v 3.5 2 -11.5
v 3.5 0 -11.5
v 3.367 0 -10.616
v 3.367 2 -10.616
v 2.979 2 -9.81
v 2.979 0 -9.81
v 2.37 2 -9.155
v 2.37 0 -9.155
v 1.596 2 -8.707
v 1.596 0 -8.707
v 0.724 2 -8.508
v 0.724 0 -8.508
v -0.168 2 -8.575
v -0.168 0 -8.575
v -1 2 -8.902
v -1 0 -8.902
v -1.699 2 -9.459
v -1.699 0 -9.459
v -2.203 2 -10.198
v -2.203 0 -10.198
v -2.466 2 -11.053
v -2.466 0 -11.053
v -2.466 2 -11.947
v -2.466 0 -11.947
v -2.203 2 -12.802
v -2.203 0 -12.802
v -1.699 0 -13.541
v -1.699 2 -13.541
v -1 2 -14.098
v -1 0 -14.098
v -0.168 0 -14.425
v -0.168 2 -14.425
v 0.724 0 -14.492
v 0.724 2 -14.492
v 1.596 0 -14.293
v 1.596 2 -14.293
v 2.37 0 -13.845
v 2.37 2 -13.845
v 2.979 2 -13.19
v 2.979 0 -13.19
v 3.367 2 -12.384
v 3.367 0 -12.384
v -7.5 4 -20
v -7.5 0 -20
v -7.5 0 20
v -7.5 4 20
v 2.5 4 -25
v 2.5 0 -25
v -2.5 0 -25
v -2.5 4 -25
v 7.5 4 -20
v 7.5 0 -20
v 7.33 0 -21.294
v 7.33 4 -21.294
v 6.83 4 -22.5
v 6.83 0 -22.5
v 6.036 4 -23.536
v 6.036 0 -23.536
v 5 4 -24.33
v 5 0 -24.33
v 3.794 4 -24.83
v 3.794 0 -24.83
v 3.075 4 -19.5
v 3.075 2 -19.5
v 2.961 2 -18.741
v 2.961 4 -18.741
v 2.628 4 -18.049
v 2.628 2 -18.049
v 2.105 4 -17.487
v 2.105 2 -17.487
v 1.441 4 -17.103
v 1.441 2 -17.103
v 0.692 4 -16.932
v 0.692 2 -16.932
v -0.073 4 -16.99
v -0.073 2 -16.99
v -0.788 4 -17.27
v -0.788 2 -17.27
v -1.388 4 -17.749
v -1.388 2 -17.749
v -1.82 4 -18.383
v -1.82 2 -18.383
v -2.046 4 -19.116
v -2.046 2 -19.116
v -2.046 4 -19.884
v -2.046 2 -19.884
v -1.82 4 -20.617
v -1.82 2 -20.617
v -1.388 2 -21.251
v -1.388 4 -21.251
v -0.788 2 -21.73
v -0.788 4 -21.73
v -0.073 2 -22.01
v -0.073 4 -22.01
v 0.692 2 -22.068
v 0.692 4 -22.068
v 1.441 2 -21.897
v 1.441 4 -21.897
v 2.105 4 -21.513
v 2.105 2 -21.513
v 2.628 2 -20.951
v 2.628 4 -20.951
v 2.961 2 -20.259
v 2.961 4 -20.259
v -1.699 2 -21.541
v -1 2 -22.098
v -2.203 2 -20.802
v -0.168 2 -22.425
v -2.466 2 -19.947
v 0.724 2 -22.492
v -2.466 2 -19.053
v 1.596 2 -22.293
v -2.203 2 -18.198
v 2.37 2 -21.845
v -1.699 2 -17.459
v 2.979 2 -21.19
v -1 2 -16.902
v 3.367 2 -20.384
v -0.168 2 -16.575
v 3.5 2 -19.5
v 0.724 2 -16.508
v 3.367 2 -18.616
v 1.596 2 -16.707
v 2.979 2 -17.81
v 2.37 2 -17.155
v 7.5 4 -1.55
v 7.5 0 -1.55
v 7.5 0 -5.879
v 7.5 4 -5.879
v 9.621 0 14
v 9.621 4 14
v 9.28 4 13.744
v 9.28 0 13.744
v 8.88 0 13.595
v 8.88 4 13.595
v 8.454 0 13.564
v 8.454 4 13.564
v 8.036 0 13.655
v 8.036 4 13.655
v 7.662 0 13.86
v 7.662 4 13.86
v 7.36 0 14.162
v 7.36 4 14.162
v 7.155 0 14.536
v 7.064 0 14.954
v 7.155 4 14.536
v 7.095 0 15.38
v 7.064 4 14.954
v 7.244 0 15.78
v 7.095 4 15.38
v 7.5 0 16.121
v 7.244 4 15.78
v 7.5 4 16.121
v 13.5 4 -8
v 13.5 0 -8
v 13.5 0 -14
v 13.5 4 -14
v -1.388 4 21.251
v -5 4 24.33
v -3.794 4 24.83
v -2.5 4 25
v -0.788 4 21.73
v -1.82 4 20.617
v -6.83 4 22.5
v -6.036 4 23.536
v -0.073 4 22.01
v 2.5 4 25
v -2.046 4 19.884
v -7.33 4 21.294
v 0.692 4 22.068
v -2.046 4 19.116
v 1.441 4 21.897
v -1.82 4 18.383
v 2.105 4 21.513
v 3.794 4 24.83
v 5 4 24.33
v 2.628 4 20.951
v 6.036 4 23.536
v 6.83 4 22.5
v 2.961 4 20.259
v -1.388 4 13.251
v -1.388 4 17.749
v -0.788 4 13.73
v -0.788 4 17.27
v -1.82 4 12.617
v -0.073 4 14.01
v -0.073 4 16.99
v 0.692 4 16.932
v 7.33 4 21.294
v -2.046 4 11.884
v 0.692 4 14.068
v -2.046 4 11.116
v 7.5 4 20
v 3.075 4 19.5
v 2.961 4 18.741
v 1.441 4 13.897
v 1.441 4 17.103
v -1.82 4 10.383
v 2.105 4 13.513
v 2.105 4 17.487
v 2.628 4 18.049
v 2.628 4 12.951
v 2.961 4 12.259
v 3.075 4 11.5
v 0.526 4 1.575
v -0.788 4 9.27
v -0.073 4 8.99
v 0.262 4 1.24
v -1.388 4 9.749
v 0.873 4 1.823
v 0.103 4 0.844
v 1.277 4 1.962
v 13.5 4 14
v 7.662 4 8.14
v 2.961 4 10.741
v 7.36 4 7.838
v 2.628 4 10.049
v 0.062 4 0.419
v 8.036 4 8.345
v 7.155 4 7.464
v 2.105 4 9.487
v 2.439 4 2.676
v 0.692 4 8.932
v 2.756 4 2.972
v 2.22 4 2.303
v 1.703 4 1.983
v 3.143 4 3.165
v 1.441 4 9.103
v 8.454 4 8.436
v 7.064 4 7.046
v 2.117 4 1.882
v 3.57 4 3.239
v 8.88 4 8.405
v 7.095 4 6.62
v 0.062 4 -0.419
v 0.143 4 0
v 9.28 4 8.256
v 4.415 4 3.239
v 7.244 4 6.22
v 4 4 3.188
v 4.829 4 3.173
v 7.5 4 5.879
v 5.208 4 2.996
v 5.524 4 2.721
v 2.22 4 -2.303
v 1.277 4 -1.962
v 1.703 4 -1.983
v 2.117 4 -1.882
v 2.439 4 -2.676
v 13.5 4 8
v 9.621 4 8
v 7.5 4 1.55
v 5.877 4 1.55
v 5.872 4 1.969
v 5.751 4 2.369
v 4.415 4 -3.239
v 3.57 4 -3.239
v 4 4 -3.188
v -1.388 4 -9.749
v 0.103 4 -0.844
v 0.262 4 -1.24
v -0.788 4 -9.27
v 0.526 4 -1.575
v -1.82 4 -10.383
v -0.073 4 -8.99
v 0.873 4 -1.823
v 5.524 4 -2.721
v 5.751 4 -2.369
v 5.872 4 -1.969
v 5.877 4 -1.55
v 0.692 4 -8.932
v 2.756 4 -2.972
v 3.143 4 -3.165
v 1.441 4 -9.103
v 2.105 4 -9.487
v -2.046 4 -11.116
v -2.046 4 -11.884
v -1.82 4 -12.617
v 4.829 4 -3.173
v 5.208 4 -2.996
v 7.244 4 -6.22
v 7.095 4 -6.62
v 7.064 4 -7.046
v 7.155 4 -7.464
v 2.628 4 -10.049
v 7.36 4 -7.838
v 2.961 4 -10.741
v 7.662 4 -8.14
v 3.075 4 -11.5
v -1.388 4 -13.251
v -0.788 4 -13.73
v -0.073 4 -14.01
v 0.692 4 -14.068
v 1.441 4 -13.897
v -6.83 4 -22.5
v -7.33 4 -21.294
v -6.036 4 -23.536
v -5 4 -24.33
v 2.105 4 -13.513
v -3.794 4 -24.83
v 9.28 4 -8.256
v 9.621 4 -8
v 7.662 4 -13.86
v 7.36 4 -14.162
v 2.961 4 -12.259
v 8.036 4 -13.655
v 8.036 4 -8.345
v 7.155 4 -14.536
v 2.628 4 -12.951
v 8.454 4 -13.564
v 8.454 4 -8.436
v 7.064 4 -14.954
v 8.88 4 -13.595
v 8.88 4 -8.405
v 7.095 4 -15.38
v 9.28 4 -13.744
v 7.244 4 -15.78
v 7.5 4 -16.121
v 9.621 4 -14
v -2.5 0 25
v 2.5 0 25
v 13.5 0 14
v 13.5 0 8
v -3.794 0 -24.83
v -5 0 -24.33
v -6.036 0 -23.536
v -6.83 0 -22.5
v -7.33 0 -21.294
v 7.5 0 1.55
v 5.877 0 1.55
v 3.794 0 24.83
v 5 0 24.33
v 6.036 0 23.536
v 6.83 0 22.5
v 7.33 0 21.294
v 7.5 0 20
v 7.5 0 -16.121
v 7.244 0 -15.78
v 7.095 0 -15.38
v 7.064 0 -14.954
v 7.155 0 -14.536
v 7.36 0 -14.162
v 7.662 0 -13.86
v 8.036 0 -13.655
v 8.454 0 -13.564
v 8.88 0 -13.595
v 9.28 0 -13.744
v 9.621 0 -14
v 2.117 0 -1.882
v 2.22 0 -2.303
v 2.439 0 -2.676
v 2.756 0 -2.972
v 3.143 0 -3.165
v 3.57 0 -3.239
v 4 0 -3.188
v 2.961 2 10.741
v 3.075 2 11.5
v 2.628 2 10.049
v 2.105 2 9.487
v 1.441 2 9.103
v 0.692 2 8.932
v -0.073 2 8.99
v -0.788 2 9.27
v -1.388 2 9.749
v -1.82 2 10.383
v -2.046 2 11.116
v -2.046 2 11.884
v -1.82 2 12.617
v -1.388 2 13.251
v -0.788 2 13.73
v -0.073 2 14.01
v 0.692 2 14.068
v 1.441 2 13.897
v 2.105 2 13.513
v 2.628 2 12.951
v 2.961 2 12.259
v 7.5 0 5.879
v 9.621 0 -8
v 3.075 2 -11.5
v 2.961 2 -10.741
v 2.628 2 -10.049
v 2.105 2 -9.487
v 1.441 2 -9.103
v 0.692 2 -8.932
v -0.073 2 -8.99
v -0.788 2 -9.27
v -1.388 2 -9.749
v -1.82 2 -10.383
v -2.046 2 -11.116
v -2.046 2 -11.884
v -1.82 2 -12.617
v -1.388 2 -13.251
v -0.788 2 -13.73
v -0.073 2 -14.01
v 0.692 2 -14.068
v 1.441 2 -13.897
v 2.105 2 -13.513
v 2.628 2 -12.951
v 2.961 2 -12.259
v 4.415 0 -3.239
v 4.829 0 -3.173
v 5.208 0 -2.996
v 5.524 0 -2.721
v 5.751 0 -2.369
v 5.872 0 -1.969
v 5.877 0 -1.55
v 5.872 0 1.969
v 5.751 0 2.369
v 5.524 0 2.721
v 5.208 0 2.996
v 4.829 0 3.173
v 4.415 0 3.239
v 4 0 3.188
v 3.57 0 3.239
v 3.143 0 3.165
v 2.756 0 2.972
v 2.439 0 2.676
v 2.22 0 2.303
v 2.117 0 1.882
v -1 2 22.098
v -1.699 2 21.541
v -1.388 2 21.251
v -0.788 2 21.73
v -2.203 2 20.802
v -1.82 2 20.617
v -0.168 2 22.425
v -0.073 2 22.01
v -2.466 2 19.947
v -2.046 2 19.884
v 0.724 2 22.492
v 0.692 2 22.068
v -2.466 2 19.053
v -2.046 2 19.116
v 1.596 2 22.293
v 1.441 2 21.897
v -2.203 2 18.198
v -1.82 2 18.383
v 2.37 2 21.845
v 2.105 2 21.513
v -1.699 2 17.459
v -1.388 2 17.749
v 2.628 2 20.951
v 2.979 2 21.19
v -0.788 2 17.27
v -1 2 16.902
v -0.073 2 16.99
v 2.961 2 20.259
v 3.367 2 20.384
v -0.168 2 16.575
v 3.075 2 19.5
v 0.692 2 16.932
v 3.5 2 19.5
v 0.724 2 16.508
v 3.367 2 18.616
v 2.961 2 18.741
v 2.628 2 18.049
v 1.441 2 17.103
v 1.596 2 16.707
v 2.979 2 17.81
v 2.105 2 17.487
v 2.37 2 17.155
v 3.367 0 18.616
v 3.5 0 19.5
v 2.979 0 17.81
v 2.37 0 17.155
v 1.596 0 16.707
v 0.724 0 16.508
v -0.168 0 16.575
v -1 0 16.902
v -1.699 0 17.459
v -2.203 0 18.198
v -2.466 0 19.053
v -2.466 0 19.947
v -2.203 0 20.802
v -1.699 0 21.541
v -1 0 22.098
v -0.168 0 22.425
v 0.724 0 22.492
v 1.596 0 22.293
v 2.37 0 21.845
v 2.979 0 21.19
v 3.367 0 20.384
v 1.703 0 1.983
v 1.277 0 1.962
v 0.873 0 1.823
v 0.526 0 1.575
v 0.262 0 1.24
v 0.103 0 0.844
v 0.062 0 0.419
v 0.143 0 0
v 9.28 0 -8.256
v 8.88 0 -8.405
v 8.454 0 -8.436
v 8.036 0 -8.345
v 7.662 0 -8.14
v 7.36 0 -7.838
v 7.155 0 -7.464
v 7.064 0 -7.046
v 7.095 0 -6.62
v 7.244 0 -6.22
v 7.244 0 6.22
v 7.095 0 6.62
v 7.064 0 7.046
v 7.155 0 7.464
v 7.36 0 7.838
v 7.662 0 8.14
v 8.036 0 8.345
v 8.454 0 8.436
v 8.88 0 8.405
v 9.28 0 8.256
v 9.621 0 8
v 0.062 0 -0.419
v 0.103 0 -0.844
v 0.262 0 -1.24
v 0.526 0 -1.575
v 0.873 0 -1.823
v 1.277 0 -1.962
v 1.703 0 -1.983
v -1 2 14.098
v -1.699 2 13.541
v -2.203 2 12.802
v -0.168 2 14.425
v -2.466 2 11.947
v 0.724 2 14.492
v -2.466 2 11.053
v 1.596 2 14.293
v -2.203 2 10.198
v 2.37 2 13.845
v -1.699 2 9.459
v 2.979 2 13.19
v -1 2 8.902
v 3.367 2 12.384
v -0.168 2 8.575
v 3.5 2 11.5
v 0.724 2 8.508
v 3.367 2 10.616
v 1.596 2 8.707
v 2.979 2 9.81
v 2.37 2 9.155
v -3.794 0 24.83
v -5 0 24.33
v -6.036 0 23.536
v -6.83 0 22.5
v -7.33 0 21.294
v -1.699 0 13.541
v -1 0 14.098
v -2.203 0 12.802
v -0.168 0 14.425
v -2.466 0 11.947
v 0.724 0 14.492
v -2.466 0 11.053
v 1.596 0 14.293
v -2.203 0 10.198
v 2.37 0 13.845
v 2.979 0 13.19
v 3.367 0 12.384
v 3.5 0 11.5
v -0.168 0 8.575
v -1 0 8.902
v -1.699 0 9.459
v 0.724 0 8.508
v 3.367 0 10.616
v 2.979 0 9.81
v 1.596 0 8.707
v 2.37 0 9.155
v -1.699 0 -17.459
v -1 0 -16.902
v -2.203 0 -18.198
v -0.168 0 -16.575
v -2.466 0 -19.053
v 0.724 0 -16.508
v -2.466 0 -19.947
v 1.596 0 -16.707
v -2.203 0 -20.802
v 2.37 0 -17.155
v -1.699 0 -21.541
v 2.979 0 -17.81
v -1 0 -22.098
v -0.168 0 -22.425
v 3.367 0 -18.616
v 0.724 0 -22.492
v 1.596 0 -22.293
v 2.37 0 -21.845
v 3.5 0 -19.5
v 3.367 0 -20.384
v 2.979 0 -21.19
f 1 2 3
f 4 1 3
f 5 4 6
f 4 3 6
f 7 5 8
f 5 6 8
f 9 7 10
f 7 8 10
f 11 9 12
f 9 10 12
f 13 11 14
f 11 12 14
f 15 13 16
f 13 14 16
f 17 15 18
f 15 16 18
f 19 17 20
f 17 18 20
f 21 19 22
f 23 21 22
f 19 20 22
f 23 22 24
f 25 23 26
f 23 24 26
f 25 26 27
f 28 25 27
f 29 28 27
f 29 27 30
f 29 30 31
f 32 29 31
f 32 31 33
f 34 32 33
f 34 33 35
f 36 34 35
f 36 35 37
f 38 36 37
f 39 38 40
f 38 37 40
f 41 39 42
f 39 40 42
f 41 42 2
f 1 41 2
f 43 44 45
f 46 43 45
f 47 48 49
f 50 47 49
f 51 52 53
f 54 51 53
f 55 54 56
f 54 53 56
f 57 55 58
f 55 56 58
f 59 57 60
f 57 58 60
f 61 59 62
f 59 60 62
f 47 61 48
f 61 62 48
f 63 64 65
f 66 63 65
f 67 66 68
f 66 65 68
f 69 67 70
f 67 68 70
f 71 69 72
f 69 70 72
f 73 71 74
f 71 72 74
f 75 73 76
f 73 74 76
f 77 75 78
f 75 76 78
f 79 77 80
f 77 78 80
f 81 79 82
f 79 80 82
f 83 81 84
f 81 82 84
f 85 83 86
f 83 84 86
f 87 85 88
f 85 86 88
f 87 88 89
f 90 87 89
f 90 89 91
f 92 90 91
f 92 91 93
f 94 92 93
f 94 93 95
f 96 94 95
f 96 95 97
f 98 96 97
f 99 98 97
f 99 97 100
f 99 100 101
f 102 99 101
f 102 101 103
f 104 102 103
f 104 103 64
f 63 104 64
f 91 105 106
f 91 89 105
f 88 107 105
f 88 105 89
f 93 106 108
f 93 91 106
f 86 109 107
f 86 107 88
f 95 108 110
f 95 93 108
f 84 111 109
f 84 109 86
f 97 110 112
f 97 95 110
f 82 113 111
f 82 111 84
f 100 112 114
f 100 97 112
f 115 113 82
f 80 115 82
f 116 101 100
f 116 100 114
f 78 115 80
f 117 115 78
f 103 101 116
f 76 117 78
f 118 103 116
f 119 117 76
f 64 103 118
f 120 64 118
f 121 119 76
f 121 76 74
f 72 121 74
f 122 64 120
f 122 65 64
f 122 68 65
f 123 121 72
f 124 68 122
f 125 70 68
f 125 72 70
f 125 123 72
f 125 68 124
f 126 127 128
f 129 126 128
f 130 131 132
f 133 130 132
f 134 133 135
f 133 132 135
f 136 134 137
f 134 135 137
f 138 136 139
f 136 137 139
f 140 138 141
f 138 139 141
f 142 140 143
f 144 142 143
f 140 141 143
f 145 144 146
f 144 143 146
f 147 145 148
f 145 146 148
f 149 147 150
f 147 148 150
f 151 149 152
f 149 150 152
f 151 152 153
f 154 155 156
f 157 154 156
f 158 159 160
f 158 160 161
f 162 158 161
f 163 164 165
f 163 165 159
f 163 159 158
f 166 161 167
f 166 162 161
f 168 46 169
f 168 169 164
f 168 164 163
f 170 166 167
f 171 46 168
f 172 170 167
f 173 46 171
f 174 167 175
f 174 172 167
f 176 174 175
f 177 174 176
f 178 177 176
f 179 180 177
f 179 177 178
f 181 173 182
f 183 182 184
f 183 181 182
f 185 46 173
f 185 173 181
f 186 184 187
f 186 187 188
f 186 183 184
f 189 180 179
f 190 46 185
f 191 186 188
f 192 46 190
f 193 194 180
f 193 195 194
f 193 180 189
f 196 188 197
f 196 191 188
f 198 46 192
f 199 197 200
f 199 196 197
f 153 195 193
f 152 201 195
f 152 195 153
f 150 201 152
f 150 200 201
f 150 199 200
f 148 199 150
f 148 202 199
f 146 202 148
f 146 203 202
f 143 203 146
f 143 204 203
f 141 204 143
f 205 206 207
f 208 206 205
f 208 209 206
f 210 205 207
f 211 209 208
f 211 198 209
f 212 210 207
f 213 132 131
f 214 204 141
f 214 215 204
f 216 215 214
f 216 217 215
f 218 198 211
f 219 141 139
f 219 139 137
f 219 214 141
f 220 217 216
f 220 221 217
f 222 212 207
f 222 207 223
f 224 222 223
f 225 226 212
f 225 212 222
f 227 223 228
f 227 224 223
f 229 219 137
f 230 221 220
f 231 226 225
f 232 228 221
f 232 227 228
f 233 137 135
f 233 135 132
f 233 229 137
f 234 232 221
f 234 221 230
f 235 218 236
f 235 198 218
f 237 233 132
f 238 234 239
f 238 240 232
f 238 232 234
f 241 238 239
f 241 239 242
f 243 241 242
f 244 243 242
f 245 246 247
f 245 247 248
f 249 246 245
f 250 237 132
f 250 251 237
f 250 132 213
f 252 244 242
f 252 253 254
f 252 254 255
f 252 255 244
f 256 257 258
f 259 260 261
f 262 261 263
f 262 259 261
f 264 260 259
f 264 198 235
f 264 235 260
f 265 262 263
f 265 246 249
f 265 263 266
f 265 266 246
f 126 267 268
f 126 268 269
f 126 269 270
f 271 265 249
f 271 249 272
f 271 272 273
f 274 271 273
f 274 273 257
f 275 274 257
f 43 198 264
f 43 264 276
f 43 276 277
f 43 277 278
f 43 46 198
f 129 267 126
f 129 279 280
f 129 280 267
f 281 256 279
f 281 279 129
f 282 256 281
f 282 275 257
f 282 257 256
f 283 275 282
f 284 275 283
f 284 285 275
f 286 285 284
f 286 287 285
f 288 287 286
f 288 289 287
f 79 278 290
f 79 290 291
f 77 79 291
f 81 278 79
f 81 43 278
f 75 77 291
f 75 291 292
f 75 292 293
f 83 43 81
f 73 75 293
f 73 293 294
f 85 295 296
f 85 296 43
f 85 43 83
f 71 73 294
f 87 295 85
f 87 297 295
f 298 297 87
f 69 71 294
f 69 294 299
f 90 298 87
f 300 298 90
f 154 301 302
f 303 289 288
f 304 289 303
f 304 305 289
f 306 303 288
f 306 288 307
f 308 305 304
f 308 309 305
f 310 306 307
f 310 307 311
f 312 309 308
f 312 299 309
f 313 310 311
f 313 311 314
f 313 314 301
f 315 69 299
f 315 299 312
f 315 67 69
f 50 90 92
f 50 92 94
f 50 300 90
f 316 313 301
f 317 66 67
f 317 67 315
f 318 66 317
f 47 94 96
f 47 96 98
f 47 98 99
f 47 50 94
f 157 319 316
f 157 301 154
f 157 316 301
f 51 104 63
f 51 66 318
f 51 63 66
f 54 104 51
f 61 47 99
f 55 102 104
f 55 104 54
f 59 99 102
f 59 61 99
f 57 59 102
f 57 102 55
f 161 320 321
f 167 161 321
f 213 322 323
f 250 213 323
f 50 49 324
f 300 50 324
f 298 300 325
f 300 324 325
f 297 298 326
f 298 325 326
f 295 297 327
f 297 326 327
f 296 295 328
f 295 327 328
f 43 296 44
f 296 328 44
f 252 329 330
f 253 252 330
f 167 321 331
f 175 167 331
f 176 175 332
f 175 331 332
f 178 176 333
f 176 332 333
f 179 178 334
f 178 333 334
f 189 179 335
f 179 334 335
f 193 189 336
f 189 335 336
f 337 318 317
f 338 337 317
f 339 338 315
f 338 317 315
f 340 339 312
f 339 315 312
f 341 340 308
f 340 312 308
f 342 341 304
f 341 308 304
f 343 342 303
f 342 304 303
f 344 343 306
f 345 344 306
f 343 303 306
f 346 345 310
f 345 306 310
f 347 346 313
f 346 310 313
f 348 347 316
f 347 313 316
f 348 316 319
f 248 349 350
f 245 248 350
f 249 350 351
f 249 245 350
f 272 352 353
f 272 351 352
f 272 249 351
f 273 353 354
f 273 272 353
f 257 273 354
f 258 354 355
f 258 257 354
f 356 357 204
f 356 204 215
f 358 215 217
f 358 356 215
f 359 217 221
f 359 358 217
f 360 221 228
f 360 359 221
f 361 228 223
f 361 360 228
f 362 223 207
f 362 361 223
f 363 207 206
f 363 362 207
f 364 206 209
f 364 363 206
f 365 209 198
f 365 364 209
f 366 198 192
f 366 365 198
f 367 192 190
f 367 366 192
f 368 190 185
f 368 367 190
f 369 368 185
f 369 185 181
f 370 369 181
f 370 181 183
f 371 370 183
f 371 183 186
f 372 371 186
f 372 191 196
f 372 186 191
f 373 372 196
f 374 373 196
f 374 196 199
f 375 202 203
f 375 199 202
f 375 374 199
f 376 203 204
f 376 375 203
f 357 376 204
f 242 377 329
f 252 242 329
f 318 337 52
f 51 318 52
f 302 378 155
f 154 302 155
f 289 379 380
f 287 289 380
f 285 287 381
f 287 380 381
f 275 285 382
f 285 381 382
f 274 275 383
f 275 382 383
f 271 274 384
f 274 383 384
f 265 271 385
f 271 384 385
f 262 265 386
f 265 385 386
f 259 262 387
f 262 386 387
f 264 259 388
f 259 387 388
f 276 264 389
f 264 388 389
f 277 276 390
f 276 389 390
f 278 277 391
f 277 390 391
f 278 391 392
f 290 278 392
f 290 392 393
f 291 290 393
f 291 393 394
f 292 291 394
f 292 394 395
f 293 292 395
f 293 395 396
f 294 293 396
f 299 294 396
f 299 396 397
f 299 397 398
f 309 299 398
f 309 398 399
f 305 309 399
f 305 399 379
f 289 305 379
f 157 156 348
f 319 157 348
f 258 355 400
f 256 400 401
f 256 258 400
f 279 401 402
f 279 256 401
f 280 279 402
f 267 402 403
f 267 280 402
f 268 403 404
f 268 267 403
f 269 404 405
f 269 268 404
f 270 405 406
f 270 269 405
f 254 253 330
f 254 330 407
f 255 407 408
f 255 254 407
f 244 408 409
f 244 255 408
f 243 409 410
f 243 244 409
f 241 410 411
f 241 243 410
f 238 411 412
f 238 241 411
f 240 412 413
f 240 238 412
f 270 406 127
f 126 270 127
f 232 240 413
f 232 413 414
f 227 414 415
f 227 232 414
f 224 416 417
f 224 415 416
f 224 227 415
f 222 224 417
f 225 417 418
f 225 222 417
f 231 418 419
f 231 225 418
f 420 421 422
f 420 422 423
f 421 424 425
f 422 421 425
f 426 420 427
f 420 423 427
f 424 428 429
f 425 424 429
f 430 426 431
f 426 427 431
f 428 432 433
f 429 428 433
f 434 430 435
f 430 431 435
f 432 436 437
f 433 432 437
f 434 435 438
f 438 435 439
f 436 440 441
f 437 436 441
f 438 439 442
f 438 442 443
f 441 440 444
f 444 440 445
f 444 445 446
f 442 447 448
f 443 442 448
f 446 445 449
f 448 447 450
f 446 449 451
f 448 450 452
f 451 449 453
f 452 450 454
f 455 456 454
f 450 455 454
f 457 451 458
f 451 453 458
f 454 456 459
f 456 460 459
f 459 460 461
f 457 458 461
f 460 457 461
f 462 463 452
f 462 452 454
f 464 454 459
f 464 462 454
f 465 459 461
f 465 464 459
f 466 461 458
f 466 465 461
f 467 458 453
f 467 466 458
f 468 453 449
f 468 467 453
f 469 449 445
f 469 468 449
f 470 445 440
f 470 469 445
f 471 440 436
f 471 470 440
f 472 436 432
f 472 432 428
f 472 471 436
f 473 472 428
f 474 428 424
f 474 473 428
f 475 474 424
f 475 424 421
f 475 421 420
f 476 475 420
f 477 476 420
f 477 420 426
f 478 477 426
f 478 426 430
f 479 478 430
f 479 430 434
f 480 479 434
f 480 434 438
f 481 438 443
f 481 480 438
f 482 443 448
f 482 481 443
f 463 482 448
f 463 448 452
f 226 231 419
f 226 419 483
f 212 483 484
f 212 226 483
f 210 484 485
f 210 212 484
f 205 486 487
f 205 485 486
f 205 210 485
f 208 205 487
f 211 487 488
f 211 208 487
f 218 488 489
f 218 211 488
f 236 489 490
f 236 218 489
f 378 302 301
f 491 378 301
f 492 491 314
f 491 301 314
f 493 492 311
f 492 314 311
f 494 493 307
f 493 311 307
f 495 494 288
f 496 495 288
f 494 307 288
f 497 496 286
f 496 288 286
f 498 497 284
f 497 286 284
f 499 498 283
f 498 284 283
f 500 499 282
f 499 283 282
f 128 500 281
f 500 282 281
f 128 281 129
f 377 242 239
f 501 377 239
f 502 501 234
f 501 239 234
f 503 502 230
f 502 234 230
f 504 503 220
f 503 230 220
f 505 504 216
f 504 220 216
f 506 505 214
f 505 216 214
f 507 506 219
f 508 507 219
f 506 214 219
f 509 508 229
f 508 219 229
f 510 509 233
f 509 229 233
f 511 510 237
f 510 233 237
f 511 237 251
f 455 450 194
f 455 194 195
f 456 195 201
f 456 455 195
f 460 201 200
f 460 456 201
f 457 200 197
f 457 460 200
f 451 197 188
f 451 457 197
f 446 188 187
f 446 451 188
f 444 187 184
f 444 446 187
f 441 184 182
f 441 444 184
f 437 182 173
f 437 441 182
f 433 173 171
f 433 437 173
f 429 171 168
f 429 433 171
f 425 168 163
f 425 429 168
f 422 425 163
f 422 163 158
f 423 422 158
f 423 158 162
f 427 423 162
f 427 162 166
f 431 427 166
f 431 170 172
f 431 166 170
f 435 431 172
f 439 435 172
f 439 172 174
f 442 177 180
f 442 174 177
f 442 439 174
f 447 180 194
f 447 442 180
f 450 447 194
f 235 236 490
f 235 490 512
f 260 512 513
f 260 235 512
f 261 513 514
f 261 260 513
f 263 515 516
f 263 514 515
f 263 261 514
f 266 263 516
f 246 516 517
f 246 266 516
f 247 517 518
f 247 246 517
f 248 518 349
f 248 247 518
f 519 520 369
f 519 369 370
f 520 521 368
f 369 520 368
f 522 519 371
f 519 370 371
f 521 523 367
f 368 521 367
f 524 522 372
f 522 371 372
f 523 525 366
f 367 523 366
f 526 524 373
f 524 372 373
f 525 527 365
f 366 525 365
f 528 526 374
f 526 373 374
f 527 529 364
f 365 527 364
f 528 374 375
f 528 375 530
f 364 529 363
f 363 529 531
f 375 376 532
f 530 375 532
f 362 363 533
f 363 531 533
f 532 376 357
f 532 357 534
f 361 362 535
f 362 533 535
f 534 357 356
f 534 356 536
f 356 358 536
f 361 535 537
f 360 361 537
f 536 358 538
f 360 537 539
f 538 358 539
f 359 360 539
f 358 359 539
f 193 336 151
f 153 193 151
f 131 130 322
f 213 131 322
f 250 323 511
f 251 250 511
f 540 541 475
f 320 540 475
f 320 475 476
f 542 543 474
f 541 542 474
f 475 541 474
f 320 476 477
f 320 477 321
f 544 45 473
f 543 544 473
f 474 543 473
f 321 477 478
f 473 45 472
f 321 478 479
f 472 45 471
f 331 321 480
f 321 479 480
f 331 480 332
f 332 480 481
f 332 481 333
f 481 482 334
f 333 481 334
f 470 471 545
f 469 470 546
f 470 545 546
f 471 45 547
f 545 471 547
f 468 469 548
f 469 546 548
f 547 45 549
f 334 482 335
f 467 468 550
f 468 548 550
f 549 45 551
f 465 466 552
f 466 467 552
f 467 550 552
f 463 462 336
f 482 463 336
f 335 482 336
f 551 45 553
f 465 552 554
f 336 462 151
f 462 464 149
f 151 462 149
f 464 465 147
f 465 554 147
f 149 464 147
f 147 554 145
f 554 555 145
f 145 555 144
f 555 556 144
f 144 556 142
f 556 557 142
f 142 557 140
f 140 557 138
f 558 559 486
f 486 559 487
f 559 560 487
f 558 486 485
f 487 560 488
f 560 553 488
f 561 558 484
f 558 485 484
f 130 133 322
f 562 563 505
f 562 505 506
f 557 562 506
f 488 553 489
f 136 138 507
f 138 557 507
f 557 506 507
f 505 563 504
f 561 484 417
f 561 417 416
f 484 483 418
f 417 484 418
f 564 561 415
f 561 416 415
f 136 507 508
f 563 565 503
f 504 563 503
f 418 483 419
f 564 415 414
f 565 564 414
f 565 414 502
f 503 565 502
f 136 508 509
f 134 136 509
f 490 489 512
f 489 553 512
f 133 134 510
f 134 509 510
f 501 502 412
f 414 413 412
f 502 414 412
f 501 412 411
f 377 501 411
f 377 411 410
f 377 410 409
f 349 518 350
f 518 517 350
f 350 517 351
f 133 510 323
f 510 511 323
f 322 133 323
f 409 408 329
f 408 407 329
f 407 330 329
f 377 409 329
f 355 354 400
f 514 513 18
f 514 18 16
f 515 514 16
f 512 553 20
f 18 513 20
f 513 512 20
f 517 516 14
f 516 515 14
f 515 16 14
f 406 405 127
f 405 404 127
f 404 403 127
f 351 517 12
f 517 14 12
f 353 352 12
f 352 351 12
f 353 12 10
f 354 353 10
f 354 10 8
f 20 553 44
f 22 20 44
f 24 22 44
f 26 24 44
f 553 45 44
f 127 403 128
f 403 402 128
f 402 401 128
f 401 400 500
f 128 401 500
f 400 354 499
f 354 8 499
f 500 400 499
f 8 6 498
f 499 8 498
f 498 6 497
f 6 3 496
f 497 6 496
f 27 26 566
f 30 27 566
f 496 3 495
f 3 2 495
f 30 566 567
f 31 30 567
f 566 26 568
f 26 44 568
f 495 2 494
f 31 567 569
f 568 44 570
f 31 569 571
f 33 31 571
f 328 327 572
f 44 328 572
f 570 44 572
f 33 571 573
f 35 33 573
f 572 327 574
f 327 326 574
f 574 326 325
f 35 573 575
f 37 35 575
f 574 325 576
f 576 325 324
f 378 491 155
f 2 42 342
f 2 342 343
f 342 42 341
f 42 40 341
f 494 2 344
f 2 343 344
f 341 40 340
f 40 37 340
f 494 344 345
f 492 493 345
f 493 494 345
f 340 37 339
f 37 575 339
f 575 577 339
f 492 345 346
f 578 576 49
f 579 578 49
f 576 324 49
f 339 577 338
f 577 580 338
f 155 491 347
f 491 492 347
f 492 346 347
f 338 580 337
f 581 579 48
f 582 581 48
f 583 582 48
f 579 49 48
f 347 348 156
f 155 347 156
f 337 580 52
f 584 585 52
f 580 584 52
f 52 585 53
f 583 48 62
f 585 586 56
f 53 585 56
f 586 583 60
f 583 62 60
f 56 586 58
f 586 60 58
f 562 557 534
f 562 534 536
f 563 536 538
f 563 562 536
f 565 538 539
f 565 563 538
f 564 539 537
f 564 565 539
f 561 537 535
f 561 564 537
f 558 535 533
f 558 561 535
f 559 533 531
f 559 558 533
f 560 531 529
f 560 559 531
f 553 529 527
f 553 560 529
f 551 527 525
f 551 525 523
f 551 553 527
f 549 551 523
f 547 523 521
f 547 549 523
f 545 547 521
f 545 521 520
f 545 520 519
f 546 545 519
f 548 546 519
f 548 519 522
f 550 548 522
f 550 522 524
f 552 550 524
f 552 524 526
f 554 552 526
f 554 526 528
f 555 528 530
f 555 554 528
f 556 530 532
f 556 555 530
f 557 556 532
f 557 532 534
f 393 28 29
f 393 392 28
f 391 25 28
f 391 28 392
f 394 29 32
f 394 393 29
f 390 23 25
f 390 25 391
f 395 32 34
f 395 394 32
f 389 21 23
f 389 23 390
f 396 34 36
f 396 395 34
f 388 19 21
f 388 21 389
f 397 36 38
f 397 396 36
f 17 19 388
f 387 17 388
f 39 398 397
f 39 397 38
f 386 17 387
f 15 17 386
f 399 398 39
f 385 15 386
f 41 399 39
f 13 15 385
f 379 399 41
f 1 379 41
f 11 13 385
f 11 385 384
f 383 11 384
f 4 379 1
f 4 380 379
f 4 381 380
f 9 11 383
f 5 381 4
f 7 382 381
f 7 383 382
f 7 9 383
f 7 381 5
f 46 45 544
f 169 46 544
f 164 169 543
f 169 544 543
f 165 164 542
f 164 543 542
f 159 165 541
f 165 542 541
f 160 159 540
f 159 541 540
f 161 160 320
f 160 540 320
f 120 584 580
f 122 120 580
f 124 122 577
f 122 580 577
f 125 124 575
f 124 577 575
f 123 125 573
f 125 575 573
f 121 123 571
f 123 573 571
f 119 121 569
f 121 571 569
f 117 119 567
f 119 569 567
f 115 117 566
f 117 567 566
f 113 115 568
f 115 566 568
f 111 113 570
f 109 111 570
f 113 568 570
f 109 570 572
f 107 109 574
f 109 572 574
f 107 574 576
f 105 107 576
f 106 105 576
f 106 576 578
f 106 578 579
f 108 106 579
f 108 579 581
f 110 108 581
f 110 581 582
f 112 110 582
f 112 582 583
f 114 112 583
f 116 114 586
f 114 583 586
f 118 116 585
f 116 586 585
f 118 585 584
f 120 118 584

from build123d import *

# Parameters (mm, degrees)
SALIENTE_EXTRUIR1_DEPTH = 4
CORTAR_EXTRUIR4_DEPTH   = 5
CROQUIS10_R             = 1.5
CORTAR_EXTRUIR5_DEPTH   = 5
CROQUIS12_R             = 2.575
CORTAR_EXTRUIR6_DEPTH   = 5
CROQUIS13_R             = 3
CORTAR_EXTRUIR7_DEPTH   = 2


with BuildPart() as part:
    # Croquis1 → Saliente-Extruir1 (new body)
    with BuildSketch(Plane(origin=(0, 0, 0), x_dir=(1, 0, 0), z_dir=(0, 1, 0))):
        with BuildLine():
            Line((-2.5, -25), (2.5, -25))
            ThreePointArc((2.5, -25), (6.035533906, -23.535533906), (7.5, -20))
            Line((7.5, -20), (7.5, -14))
            Line((7.5, -14), (13.5, -14))
            Line((13.5, -14), (13.5, -8))
            Line((13.5, -8), (7.5, -8))
            Line((7.5, -8), (7.5, -1.55))
            Line((7.5, -1.55), (5.45, -1.55))
            Line((5.45, -1.55), (5.45, -2.8))
            Line((5.45, -2.8), (2.55, -2.8))
            Line((2.55, -2.8), (2.55, -1.55))
            Line((2.55, -1.55), (0.5, -1.55))
            Line((0.5, -1.55), (0.5, 1.55))
            Line((0.5, 1.55), (2.55, 1.55))
            Line((2.55, 1.55), (2.55, 2.8))
            Line((2.55, 2.8), (5.45, 2.8))
            Line((5.45, 2.8), (5.45, 1.55))
            Line((5.45, 1.55), (7.5, 1.55))
            Line((7.5, 1.55), (7.5, 8))
            Line((7.5, 8), (13.5, 8))
            Line((13.5, 8), (13.5, 14))
            Line((13.5, 14), (7.5, 14))
            Line((7.5, 14), (7.5, 20))
            ThreePointArc((7.5, 20), (6.035533906, 23.535533906), (2.5, 25))
            Line((2.5, 25), (-2.5, 25))
            ThreePointArc((-2.5, 25), (-6.035533906, 23.535533906), (-7.5, 20))
            Line((-7.5, 20), (-7.5, -20))
            ThreePointArc((-7.5, -20), (-6.035533906, -23.535533906), (-2.5, -25))
        make_face()
    extrude(amount=SALIENTE_EXTRUIR1_DEPTH)

    # Croquis7 → Cortar-Extruir4 (cut, through all)
    with BuildSketch(Plane(origin=(0, 4, 0), x_dir=(1, 0, 0), z_dir=(0, 1, 0))):
        with BuildLine():
            Line((5.877341989, 1.55), (7.5, 1.55))
            Line((7.5, 1.55), (7.5, -1.55))
            Line((7.5, -1.55), (5.877341989, -1.55))
            ThreePointArc((5.877341989, -1.55), (5.375478098, -2.869619136), (4, -3.187930349))
            ThreePointArc((4, -3.187930349), (2.755747615, -2.971867524), (2.117475162, -1.882163243))
            ThreePointArc((2.117475162, -1.882163243), (0.52576038, -1.575149398), (0.14272275, 0))
            ThreePointArc((0.14272275, 0), (0.52576038, 1.575149398), (2.117475162, 1.882163243))
            ThreePointArc((2.117475162, 1.882163243), (2.755747615, 2.971867524), (4, 3.187930349))
            ThreePointArc((4, 3.187930349), (5.375478098, 2.869619136), (5.877341989, 1.55))
        make_face()
    extrude(amount=-CORTAR_EXTRUIR4_DEPTH, mode=Mode.SUBTRACT)

    # Croquis10 → Cortar-Extruir5 (cut, through all)
    with BuildSketch(Plane(origin=(0, 4, 0), x_dir=(1, 0, 0), z_dir=(0, 1, 0))):
        with Locations((8.560660172, 15.060660172)):
            Circle(CROQUIS10_R)
        with Locations((8.560660172, 6.939339828)):
            Circle(CROQUIS10_R)
        with Locations((8.560660172, -15.060660172)):
            Circle(CROQUIS10_R)
        with Locations((8.560660172, -6.939339828)):
            Circle(CROQUIS10_R)
    extrude(amount=-CORTAR_EXTRUIR5_DEPTH, mode=Mode.SUBTRACT)

    # Croquis12 → Cortar-Extruir6 (cut, through all)
    with BuildSketch(Plane.XZ):
        with Locations((0.5, -11.5)):
            Circle(CROQUIS12_R)
        with Locations((0.5, -19.5)):
            Circle(CROQUIS12_R)
    cortar_extruir6 = extrude(amount=-CORTAR_EXTRUIR6_DEPTH, mode=Mode.SUBTRACT)

    # Croquis13 → Cortar-Extruir7 (cut)
    with BuildSketch(Plane.XZ):
        with Locations((0.5, -11.5)):
            Circle(CROQUIS13_R)
        with Locations((0.5, -19.5)):
            Circle(CROQUIS13_R)
    cortar_extruir7 = extrude(amount=-CORTAR_EXTRUIR7_DEPTH, mode=Mode.SUBTRACT)

    # Simetría1: Cortar-Extruir6, Cortar-Extruir7 across plane
    add(cortar_extruir6.mirror(Plane.XY), mode=Mode.SUBTRACT)
    add(cortar_extruir7.mirror(Plane.XY), mode=Mode.SUBTRACT)


solid = part.part
